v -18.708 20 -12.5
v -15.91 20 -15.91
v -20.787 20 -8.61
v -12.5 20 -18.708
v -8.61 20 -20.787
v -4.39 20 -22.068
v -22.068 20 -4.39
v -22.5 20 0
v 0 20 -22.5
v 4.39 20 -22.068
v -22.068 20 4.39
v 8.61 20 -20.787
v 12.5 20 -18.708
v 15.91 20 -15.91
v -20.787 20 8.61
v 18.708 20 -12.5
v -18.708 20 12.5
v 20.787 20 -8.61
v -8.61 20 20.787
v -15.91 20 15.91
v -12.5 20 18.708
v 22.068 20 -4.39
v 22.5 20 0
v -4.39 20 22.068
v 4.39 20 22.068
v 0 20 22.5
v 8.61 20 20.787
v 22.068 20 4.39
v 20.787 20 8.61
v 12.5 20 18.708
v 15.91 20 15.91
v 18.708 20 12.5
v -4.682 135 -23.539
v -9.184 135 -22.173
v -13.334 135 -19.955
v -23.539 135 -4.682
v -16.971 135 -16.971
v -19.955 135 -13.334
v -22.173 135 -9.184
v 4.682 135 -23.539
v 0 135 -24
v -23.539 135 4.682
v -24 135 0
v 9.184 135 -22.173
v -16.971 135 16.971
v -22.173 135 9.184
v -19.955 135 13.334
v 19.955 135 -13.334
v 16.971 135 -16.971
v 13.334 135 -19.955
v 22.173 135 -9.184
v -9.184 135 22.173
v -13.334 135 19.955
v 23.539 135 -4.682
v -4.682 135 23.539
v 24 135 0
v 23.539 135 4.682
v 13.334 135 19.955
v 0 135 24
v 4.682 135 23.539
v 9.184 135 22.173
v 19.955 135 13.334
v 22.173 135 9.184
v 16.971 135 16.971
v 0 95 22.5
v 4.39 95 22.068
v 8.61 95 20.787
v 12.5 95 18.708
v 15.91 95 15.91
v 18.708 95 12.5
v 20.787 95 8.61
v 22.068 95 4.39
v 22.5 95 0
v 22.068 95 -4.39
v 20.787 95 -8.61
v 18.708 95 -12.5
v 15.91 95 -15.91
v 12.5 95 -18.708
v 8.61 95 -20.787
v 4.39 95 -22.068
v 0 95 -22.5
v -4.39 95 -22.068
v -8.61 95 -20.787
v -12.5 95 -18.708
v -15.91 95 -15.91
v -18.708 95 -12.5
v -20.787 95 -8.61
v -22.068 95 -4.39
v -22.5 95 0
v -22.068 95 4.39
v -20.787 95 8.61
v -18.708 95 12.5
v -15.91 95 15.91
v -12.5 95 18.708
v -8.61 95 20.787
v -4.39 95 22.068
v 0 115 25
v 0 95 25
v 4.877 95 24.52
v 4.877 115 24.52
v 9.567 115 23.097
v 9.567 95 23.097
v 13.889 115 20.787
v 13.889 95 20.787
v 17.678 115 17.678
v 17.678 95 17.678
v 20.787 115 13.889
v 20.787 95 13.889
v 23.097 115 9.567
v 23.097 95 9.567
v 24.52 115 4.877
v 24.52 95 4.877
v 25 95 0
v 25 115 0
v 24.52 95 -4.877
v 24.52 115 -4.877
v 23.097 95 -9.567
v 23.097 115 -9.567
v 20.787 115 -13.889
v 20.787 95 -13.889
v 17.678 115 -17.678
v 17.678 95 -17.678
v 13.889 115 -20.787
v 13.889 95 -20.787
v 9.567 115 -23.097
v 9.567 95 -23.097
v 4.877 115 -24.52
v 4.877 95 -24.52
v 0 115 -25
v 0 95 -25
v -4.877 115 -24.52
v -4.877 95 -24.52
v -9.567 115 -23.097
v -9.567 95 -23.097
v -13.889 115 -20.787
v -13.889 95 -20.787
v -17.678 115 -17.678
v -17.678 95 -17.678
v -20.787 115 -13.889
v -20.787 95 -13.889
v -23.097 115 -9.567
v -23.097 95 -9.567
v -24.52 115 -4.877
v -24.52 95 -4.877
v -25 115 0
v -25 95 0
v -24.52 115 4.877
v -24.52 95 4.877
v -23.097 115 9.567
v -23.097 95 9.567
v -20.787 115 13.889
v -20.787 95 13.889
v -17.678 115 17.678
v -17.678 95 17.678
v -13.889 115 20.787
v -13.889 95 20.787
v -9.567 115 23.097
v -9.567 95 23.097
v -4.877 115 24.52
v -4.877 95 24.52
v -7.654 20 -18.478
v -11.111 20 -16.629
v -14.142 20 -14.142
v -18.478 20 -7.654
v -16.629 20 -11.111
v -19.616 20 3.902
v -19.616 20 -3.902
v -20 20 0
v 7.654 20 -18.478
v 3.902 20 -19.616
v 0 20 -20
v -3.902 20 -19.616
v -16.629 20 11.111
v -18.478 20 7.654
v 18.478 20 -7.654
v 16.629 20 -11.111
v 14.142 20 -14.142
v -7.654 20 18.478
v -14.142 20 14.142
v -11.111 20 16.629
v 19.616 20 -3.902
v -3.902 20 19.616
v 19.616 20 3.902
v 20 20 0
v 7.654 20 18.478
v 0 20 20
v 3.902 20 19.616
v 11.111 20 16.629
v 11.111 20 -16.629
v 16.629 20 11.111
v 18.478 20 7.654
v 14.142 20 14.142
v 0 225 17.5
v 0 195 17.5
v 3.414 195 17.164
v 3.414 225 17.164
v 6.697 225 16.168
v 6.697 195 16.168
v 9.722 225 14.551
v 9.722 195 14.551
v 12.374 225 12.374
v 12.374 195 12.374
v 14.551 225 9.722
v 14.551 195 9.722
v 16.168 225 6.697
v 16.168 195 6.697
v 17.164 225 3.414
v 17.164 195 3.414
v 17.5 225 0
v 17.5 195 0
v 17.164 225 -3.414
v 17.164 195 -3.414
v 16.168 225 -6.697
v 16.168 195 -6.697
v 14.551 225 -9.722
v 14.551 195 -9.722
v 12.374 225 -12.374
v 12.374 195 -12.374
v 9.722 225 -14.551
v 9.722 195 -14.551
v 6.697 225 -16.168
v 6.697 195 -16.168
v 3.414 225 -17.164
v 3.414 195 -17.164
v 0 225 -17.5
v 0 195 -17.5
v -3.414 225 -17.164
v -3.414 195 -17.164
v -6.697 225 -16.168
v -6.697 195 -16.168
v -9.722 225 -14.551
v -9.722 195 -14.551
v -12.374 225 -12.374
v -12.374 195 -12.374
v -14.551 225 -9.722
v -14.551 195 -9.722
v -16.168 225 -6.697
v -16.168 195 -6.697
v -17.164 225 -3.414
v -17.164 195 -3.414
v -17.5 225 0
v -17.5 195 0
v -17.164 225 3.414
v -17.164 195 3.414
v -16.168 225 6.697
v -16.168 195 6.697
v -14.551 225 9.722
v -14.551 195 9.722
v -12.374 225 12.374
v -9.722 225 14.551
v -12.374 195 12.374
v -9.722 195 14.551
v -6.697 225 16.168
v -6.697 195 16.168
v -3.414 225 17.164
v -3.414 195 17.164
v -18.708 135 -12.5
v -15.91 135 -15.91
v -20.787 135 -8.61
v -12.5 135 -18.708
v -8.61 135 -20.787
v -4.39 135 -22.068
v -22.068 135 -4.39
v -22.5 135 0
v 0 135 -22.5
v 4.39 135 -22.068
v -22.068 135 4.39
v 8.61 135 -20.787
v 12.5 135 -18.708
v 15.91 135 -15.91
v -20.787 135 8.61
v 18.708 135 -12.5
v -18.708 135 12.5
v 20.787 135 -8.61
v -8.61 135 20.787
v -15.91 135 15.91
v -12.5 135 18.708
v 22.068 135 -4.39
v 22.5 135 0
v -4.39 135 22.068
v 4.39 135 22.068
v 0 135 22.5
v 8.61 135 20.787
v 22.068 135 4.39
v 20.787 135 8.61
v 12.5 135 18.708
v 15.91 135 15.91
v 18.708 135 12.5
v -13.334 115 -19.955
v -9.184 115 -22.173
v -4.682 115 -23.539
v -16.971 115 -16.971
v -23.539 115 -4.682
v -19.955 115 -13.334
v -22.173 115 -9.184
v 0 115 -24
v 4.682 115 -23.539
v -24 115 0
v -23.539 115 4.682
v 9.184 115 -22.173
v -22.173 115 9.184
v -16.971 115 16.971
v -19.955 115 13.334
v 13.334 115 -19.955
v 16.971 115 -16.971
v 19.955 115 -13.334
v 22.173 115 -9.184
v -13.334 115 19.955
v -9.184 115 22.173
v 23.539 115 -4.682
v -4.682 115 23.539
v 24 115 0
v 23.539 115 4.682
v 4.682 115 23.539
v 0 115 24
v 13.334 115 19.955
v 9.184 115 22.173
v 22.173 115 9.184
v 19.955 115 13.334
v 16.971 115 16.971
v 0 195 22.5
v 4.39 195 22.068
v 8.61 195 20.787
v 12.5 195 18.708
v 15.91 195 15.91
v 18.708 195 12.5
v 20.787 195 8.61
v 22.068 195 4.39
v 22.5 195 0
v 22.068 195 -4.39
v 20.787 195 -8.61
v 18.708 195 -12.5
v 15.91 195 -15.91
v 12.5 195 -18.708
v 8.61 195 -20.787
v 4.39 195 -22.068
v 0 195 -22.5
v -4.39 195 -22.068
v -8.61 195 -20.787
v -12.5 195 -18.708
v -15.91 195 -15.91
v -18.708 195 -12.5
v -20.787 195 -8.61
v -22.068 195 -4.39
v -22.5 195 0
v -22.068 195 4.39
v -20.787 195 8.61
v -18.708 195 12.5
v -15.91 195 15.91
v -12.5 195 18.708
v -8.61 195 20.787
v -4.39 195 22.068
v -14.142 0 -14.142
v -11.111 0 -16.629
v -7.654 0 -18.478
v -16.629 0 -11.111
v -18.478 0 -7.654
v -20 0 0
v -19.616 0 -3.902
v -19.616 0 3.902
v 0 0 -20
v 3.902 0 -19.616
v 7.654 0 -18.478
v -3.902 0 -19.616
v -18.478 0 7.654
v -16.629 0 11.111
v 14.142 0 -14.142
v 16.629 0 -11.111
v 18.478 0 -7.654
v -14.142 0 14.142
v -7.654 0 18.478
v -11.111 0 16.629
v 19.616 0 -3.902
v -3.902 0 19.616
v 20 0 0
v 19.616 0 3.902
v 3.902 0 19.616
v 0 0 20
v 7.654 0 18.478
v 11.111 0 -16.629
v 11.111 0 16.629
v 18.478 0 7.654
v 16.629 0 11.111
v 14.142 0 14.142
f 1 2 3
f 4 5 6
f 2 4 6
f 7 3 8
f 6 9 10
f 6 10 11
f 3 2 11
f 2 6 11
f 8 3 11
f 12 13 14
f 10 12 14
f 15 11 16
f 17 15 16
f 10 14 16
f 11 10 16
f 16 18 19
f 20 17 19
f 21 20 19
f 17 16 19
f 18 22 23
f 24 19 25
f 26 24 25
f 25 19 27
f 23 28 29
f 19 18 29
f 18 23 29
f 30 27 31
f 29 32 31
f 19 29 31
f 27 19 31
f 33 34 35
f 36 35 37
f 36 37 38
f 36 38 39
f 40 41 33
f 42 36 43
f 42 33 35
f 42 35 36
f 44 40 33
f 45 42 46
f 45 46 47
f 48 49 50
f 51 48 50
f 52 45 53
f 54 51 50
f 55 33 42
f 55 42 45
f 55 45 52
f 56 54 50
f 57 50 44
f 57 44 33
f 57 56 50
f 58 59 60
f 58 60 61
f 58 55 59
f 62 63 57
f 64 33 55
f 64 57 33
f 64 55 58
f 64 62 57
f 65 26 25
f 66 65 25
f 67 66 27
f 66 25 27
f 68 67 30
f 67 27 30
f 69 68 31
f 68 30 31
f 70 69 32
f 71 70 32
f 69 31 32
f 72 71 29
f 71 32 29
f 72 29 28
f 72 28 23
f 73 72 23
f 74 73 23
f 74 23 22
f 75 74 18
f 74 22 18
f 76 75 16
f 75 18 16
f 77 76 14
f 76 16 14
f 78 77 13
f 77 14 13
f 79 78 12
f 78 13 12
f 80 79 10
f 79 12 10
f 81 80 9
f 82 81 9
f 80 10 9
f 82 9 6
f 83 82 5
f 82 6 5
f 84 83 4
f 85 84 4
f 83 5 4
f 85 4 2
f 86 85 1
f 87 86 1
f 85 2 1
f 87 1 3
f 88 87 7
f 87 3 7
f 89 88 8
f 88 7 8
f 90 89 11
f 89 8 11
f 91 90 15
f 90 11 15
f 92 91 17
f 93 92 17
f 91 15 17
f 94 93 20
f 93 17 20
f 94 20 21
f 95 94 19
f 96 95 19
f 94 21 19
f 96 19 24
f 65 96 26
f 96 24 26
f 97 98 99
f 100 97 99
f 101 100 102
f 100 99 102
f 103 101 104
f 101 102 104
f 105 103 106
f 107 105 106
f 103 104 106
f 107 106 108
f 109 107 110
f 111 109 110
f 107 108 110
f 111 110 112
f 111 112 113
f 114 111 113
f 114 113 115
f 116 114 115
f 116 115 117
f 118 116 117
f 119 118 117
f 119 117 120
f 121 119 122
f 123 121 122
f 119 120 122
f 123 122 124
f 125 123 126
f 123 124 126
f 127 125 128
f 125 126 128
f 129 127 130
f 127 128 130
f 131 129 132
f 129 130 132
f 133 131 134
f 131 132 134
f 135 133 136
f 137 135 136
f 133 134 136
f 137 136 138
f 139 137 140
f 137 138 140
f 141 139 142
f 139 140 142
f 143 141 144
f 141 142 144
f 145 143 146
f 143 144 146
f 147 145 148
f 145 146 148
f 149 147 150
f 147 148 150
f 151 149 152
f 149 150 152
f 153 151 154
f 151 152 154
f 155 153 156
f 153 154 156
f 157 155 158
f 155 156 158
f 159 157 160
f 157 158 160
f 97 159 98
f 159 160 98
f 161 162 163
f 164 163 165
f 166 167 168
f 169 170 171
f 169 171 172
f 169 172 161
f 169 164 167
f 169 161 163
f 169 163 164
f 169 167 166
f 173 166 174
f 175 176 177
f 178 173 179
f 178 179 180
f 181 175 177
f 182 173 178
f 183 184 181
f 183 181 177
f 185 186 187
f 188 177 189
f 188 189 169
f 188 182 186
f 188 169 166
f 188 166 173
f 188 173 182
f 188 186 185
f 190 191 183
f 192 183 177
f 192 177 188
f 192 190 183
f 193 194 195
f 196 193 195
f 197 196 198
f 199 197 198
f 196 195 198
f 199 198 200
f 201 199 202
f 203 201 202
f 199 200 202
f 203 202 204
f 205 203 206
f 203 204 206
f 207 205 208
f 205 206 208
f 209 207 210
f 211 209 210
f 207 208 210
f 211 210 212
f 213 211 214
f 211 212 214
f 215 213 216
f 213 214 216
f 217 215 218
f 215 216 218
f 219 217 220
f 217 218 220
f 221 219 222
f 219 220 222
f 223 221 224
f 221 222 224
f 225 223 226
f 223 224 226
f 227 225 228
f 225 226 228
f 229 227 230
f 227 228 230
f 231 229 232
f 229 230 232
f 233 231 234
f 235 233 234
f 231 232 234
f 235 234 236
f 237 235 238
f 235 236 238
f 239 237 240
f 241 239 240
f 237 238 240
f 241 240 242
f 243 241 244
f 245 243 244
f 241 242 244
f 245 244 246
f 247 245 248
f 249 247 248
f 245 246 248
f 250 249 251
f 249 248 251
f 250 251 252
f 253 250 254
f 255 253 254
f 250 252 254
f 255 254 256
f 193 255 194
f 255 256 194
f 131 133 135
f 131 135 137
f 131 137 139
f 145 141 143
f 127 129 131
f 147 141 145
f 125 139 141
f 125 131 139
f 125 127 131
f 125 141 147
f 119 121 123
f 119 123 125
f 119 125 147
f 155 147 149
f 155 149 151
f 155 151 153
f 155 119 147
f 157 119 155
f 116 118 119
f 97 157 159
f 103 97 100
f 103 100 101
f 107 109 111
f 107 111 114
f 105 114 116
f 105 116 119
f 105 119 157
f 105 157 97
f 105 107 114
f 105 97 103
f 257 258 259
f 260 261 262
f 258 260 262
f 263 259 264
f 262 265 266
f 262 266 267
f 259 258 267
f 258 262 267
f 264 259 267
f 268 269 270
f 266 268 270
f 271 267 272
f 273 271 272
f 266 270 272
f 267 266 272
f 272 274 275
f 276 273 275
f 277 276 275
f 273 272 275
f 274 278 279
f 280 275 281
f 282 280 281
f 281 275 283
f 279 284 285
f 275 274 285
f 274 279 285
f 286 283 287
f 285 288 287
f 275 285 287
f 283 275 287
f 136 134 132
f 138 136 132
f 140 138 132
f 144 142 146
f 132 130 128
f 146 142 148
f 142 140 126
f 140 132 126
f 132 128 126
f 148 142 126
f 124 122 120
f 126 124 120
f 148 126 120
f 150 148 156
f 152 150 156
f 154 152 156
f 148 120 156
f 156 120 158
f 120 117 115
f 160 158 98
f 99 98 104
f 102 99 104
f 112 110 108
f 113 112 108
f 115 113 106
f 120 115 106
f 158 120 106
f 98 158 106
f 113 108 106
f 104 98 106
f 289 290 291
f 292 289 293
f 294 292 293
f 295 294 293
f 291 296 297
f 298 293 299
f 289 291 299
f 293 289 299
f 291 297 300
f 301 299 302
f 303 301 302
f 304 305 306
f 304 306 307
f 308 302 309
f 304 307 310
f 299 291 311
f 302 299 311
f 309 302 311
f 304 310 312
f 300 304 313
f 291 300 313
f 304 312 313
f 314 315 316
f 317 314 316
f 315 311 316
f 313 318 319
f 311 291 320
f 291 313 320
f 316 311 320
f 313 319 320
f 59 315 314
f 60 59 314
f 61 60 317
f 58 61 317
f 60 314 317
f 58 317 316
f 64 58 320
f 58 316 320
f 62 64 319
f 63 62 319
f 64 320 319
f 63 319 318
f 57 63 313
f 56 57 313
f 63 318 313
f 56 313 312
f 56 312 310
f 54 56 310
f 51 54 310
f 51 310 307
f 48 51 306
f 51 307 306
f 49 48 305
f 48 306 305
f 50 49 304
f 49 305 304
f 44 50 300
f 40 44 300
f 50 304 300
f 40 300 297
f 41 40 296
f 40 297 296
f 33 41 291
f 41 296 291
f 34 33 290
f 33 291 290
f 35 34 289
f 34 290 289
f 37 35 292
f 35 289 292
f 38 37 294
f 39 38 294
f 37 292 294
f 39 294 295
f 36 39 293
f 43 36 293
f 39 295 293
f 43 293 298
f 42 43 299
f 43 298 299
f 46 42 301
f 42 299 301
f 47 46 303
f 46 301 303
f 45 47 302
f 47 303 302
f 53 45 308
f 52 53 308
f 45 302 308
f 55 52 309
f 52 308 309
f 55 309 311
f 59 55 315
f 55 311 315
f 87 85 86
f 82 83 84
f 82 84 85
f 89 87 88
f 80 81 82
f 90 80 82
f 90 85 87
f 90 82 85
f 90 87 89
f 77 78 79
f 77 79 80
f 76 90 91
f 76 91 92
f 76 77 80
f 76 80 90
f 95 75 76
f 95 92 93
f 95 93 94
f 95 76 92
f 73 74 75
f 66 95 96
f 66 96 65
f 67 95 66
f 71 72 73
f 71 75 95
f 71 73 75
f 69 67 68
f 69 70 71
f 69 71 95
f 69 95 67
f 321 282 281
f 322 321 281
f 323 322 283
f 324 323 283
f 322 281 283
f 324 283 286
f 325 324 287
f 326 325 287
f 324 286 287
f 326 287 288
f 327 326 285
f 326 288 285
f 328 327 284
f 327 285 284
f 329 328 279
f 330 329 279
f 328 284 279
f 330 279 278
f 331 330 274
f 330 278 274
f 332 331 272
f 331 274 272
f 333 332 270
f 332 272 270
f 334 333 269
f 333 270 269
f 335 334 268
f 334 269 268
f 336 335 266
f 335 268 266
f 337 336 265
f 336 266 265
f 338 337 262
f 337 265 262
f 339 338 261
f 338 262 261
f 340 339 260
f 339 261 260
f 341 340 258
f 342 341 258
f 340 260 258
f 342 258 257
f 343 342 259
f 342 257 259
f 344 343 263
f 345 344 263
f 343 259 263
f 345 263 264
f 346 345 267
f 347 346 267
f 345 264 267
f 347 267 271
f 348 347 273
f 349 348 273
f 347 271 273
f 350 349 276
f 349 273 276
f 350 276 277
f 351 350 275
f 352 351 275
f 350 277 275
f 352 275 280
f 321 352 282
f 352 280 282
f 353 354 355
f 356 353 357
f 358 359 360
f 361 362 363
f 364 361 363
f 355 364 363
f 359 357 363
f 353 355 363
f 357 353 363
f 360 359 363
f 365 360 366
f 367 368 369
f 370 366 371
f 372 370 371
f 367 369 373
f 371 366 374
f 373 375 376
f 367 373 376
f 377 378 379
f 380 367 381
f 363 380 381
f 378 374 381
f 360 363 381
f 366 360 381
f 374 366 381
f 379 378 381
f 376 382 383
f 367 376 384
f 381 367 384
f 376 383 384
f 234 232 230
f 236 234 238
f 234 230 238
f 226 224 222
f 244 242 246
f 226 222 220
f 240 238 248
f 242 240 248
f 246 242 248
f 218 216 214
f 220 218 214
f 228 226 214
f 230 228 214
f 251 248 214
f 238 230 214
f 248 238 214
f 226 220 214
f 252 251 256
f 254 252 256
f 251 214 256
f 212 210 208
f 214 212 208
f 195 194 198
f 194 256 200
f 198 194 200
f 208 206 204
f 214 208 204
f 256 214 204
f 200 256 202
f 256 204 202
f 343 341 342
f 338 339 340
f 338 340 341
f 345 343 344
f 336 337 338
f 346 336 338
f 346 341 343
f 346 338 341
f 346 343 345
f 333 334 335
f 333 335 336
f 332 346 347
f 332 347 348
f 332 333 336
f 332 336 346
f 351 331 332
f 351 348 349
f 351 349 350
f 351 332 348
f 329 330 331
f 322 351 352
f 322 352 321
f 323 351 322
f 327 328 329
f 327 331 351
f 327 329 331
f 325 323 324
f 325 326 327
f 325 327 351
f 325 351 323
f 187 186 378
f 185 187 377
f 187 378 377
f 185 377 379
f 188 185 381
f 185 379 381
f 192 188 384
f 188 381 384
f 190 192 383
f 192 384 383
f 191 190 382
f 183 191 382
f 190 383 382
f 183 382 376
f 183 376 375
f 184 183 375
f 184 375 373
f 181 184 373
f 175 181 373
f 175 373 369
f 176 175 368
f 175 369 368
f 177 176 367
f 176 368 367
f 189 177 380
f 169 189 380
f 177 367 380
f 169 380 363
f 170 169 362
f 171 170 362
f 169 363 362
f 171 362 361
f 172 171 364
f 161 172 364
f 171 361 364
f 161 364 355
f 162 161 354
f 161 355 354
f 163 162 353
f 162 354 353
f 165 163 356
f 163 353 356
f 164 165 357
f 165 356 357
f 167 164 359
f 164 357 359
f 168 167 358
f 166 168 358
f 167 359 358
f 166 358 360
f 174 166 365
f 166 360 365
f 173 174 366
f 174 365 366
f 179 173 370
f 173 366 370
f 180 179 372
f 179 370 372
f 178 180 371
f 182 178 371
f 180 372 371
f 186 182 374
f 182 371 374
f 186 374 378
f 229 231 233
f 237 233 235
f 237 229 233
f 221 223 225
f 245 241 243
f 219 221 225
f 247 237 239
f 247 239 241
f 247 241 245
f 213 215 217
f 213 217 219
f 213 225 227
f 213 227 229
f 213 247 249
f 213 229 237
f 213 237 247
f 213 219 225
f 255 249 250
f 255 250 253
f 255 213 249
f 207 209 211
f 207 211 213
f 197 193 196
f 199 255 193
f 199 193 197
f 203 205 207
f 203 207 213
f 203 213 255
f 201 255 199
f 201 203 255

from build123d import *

# Parameters (mm, degrees)
SKETCH_1_R      = 20
EXTRUDE_1_DEPTH = 20
SKETCH_2_R      = 22.5
EXTRUDE_2_DEPTH = 75
SKETCH_3_R      = 25
EXTRUDE_3_DEPTH = 20
SKETCH_4_R      = 24
EXTRUDE_4_DEPTH = 20
SKETCH_5_R      = 22.5
EXTRUDE_5_DEPTH = 60
SKETCH_6_R      = 17.5
EXTRUDE_6_DEPTH = 30


with BuildPart() as part:
    # 草图1 → 凸台-拉伸1 (new body)
    with BuildSketch(Plane(origin=(0, 0, 0), x_dir=(1, 0, 0), z_dir=(0, 1, 0))):
        with Locations(Location((0, 0, 0), (0, 0, 270))):
            Circle(SKETCH_1_R)
    extrude(amount=EXTRUDE_1_DEPTH)


with BuildPart() as body_2:
    # 草图2 → 凸台-拉伸2 (new body)
    with BuildSketch(Plane(origin=(0, 20, 0), x_dir=(1, 0, 0), z_dir=(0, 1, 0))):
        with Locations(Location((0, 0, 0), (0, 0, 270))):
            Circle(SKETCH_2_R)
    extrude(amount=EXTRUDE_2_DEPTH)


with BuildPart() as body_3:
    # 草图3 → 凸台-拉伸3 (new body)
    with BuildSketch(Plane(origin=(0, 95, 0), x_dir=(1, 0, 0), z_dir=(0, 1, 0))):
        with Locations(Location((0, 0, 0), (0, 0, 270))):
            Circle(SKETCH_3_R)
    extrude(amount=EXTRUDE_3_DEPTH)


with BuildPart() as body_4:
    # 草图4 → 凸台-拉伸4 (new body)
    with BuildSketch(Plane(origin=(0, 115, 0), x_dir=(1, 0, 0), z_dir=(0, 1, 0))):
        with Locations(Location((0, 0, 0), (0, 0, 270))):
            Circle(SKETCH_4_R)
    extrude(amount=EXTRUDE_4_DEPTH)


with BuildPart() as body_5:
    # 草图5 → 凸台-拉伸5 (new body)
    with BuildSketch(Plane(origin=(0, 135, 0), x_dir=(1, 0, 0), z_dir=(0, 1, 0))):
        with Locations(Location((0, 0, 0), (0, 0, 270))):
            Circle(SKETCH_5_R)
    extrude(amount=EXTRUDE_5_DEPTH)


with BuildPart() as body_6:
    # 草图6 → 凸台-拉伸6 (new body)
    with BuildSketch(Plane(origin=(0, 195, 0), x_dir=(1, 0, 0), z_dir=(0, 1, 0))):
        with Locations(Location((0, 0, 0), (0, 0, 270))):
            Circle(SKETCH_6_R)
    extrude(amount=EXTRUDE_6_DEPTH)


solid = Compound([part.part, body_2.part, body_3.part, body_4.part, body_5.part, body_6.part])
